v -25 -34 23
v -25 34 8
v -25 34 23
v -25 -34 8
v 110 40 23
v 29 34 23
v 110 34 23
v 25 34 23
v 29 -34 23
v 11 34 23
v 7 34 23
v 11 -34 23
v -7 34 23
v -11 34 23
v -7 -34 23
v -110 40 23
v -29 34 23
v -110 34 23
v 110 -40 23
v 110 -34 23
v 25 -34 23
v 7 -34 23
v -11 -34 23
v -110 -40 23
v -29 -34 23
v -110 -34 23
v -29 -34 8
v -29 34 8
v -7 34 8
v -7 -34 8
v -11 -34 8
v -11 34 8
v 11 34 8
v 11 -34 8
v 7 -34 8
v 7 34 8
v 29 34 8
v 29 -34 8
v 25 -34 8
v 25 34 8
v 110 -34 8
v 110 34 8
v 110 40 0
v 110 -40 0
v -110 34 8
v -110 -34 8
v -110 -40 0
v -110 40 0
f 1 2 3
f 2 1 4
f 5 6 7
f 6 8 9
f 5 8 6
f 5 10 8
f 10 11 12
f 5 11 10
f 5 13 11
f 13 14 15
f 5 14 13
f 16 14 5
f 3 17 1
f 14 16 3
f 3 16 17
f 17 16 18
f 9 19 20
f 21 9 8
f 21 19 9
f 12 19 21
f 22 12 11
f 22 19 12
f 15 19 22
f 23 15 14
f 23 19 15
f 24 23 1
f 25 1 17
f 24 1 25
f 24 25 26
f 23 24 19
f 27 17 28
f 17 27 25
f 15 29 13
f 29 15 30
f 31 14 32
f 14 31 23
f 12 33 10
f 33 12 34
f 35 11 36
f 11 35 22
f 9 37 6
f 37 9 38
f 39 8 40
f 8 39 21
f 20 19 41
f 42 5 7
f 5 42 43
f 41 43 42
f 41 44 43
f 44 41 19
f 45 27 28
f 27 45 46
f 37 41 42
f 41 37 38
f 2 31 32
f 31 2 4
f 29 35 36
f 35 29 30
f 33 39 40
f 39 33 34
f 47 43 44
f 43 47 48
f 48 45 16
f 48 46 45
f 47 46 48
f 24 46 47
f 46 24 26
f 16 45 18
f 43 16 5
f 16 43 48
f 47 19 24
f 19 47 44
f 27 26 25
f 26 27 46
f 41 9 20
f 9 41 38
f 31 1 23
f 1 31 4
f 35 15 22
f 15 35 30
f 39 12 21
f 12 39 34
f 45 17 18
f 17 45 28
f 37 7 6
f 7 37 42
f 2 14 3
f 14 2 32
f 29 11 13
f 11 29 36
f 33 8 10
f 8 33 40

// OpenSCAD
$fn = 32;

// ----------------------------------------------------------------------
// Rib frame 220 x 80 x 23
// 4 ribs at 18 mm pitch
// ----------------------------------------------------------------------

// --- parameters (mm) ---
frame = [220, 80, 8];  // base plate size (x, y, z)
rail_w = 6;            // side rail width
ribs = 4;              // number of ribs
rib_t = 4;             // rib thickness
rib_h = 15;            // rib height above the base plate
pitch = 18;            // pitch between rib centres

// --- derived feature positions (mm) ---
span = (ribs - 1) * pitch;          // = 54   distance between the outer ribs
origin_x = -span / 2;               // = -27   X of the first rib
rib_len = frame[1] - 2 * rail_w + 2;  // = 70   rib length, 1 mm into each rail
feature_centers = [
  [origin_x + 0 * pitch, 0],
  [origin_x + 1 * pitch, 0],
  [origin_x + 2 * pitch, 0],
  [origin_x + 3 * pitch, 0]
];   // rib centre line, drives the rib loop

// base plate, two side rails, then the ribs read straight off feature_centers
union() {
  translate([-frame[0] / 2, -frame[1] / 2, 0]) cube(frame);
  translate([-frame[0] / 2, -frame[1] / 2, 0]) cube([frame[0], rail_w, frame[2] + rib_h]);
  translate([-frame[0] / 2, frame[1] / 2 - rail_w, 0]) cube([frame[0], rail_w, frame[2] + rib_h]);
  for (centre = feature_centers)
    translate([centre[0] - rib_t / 2, centre[1] - rib_len / 2, frame[2] - 1])
      cube([rib_t, rib_len, rib_h + 1]);
}
